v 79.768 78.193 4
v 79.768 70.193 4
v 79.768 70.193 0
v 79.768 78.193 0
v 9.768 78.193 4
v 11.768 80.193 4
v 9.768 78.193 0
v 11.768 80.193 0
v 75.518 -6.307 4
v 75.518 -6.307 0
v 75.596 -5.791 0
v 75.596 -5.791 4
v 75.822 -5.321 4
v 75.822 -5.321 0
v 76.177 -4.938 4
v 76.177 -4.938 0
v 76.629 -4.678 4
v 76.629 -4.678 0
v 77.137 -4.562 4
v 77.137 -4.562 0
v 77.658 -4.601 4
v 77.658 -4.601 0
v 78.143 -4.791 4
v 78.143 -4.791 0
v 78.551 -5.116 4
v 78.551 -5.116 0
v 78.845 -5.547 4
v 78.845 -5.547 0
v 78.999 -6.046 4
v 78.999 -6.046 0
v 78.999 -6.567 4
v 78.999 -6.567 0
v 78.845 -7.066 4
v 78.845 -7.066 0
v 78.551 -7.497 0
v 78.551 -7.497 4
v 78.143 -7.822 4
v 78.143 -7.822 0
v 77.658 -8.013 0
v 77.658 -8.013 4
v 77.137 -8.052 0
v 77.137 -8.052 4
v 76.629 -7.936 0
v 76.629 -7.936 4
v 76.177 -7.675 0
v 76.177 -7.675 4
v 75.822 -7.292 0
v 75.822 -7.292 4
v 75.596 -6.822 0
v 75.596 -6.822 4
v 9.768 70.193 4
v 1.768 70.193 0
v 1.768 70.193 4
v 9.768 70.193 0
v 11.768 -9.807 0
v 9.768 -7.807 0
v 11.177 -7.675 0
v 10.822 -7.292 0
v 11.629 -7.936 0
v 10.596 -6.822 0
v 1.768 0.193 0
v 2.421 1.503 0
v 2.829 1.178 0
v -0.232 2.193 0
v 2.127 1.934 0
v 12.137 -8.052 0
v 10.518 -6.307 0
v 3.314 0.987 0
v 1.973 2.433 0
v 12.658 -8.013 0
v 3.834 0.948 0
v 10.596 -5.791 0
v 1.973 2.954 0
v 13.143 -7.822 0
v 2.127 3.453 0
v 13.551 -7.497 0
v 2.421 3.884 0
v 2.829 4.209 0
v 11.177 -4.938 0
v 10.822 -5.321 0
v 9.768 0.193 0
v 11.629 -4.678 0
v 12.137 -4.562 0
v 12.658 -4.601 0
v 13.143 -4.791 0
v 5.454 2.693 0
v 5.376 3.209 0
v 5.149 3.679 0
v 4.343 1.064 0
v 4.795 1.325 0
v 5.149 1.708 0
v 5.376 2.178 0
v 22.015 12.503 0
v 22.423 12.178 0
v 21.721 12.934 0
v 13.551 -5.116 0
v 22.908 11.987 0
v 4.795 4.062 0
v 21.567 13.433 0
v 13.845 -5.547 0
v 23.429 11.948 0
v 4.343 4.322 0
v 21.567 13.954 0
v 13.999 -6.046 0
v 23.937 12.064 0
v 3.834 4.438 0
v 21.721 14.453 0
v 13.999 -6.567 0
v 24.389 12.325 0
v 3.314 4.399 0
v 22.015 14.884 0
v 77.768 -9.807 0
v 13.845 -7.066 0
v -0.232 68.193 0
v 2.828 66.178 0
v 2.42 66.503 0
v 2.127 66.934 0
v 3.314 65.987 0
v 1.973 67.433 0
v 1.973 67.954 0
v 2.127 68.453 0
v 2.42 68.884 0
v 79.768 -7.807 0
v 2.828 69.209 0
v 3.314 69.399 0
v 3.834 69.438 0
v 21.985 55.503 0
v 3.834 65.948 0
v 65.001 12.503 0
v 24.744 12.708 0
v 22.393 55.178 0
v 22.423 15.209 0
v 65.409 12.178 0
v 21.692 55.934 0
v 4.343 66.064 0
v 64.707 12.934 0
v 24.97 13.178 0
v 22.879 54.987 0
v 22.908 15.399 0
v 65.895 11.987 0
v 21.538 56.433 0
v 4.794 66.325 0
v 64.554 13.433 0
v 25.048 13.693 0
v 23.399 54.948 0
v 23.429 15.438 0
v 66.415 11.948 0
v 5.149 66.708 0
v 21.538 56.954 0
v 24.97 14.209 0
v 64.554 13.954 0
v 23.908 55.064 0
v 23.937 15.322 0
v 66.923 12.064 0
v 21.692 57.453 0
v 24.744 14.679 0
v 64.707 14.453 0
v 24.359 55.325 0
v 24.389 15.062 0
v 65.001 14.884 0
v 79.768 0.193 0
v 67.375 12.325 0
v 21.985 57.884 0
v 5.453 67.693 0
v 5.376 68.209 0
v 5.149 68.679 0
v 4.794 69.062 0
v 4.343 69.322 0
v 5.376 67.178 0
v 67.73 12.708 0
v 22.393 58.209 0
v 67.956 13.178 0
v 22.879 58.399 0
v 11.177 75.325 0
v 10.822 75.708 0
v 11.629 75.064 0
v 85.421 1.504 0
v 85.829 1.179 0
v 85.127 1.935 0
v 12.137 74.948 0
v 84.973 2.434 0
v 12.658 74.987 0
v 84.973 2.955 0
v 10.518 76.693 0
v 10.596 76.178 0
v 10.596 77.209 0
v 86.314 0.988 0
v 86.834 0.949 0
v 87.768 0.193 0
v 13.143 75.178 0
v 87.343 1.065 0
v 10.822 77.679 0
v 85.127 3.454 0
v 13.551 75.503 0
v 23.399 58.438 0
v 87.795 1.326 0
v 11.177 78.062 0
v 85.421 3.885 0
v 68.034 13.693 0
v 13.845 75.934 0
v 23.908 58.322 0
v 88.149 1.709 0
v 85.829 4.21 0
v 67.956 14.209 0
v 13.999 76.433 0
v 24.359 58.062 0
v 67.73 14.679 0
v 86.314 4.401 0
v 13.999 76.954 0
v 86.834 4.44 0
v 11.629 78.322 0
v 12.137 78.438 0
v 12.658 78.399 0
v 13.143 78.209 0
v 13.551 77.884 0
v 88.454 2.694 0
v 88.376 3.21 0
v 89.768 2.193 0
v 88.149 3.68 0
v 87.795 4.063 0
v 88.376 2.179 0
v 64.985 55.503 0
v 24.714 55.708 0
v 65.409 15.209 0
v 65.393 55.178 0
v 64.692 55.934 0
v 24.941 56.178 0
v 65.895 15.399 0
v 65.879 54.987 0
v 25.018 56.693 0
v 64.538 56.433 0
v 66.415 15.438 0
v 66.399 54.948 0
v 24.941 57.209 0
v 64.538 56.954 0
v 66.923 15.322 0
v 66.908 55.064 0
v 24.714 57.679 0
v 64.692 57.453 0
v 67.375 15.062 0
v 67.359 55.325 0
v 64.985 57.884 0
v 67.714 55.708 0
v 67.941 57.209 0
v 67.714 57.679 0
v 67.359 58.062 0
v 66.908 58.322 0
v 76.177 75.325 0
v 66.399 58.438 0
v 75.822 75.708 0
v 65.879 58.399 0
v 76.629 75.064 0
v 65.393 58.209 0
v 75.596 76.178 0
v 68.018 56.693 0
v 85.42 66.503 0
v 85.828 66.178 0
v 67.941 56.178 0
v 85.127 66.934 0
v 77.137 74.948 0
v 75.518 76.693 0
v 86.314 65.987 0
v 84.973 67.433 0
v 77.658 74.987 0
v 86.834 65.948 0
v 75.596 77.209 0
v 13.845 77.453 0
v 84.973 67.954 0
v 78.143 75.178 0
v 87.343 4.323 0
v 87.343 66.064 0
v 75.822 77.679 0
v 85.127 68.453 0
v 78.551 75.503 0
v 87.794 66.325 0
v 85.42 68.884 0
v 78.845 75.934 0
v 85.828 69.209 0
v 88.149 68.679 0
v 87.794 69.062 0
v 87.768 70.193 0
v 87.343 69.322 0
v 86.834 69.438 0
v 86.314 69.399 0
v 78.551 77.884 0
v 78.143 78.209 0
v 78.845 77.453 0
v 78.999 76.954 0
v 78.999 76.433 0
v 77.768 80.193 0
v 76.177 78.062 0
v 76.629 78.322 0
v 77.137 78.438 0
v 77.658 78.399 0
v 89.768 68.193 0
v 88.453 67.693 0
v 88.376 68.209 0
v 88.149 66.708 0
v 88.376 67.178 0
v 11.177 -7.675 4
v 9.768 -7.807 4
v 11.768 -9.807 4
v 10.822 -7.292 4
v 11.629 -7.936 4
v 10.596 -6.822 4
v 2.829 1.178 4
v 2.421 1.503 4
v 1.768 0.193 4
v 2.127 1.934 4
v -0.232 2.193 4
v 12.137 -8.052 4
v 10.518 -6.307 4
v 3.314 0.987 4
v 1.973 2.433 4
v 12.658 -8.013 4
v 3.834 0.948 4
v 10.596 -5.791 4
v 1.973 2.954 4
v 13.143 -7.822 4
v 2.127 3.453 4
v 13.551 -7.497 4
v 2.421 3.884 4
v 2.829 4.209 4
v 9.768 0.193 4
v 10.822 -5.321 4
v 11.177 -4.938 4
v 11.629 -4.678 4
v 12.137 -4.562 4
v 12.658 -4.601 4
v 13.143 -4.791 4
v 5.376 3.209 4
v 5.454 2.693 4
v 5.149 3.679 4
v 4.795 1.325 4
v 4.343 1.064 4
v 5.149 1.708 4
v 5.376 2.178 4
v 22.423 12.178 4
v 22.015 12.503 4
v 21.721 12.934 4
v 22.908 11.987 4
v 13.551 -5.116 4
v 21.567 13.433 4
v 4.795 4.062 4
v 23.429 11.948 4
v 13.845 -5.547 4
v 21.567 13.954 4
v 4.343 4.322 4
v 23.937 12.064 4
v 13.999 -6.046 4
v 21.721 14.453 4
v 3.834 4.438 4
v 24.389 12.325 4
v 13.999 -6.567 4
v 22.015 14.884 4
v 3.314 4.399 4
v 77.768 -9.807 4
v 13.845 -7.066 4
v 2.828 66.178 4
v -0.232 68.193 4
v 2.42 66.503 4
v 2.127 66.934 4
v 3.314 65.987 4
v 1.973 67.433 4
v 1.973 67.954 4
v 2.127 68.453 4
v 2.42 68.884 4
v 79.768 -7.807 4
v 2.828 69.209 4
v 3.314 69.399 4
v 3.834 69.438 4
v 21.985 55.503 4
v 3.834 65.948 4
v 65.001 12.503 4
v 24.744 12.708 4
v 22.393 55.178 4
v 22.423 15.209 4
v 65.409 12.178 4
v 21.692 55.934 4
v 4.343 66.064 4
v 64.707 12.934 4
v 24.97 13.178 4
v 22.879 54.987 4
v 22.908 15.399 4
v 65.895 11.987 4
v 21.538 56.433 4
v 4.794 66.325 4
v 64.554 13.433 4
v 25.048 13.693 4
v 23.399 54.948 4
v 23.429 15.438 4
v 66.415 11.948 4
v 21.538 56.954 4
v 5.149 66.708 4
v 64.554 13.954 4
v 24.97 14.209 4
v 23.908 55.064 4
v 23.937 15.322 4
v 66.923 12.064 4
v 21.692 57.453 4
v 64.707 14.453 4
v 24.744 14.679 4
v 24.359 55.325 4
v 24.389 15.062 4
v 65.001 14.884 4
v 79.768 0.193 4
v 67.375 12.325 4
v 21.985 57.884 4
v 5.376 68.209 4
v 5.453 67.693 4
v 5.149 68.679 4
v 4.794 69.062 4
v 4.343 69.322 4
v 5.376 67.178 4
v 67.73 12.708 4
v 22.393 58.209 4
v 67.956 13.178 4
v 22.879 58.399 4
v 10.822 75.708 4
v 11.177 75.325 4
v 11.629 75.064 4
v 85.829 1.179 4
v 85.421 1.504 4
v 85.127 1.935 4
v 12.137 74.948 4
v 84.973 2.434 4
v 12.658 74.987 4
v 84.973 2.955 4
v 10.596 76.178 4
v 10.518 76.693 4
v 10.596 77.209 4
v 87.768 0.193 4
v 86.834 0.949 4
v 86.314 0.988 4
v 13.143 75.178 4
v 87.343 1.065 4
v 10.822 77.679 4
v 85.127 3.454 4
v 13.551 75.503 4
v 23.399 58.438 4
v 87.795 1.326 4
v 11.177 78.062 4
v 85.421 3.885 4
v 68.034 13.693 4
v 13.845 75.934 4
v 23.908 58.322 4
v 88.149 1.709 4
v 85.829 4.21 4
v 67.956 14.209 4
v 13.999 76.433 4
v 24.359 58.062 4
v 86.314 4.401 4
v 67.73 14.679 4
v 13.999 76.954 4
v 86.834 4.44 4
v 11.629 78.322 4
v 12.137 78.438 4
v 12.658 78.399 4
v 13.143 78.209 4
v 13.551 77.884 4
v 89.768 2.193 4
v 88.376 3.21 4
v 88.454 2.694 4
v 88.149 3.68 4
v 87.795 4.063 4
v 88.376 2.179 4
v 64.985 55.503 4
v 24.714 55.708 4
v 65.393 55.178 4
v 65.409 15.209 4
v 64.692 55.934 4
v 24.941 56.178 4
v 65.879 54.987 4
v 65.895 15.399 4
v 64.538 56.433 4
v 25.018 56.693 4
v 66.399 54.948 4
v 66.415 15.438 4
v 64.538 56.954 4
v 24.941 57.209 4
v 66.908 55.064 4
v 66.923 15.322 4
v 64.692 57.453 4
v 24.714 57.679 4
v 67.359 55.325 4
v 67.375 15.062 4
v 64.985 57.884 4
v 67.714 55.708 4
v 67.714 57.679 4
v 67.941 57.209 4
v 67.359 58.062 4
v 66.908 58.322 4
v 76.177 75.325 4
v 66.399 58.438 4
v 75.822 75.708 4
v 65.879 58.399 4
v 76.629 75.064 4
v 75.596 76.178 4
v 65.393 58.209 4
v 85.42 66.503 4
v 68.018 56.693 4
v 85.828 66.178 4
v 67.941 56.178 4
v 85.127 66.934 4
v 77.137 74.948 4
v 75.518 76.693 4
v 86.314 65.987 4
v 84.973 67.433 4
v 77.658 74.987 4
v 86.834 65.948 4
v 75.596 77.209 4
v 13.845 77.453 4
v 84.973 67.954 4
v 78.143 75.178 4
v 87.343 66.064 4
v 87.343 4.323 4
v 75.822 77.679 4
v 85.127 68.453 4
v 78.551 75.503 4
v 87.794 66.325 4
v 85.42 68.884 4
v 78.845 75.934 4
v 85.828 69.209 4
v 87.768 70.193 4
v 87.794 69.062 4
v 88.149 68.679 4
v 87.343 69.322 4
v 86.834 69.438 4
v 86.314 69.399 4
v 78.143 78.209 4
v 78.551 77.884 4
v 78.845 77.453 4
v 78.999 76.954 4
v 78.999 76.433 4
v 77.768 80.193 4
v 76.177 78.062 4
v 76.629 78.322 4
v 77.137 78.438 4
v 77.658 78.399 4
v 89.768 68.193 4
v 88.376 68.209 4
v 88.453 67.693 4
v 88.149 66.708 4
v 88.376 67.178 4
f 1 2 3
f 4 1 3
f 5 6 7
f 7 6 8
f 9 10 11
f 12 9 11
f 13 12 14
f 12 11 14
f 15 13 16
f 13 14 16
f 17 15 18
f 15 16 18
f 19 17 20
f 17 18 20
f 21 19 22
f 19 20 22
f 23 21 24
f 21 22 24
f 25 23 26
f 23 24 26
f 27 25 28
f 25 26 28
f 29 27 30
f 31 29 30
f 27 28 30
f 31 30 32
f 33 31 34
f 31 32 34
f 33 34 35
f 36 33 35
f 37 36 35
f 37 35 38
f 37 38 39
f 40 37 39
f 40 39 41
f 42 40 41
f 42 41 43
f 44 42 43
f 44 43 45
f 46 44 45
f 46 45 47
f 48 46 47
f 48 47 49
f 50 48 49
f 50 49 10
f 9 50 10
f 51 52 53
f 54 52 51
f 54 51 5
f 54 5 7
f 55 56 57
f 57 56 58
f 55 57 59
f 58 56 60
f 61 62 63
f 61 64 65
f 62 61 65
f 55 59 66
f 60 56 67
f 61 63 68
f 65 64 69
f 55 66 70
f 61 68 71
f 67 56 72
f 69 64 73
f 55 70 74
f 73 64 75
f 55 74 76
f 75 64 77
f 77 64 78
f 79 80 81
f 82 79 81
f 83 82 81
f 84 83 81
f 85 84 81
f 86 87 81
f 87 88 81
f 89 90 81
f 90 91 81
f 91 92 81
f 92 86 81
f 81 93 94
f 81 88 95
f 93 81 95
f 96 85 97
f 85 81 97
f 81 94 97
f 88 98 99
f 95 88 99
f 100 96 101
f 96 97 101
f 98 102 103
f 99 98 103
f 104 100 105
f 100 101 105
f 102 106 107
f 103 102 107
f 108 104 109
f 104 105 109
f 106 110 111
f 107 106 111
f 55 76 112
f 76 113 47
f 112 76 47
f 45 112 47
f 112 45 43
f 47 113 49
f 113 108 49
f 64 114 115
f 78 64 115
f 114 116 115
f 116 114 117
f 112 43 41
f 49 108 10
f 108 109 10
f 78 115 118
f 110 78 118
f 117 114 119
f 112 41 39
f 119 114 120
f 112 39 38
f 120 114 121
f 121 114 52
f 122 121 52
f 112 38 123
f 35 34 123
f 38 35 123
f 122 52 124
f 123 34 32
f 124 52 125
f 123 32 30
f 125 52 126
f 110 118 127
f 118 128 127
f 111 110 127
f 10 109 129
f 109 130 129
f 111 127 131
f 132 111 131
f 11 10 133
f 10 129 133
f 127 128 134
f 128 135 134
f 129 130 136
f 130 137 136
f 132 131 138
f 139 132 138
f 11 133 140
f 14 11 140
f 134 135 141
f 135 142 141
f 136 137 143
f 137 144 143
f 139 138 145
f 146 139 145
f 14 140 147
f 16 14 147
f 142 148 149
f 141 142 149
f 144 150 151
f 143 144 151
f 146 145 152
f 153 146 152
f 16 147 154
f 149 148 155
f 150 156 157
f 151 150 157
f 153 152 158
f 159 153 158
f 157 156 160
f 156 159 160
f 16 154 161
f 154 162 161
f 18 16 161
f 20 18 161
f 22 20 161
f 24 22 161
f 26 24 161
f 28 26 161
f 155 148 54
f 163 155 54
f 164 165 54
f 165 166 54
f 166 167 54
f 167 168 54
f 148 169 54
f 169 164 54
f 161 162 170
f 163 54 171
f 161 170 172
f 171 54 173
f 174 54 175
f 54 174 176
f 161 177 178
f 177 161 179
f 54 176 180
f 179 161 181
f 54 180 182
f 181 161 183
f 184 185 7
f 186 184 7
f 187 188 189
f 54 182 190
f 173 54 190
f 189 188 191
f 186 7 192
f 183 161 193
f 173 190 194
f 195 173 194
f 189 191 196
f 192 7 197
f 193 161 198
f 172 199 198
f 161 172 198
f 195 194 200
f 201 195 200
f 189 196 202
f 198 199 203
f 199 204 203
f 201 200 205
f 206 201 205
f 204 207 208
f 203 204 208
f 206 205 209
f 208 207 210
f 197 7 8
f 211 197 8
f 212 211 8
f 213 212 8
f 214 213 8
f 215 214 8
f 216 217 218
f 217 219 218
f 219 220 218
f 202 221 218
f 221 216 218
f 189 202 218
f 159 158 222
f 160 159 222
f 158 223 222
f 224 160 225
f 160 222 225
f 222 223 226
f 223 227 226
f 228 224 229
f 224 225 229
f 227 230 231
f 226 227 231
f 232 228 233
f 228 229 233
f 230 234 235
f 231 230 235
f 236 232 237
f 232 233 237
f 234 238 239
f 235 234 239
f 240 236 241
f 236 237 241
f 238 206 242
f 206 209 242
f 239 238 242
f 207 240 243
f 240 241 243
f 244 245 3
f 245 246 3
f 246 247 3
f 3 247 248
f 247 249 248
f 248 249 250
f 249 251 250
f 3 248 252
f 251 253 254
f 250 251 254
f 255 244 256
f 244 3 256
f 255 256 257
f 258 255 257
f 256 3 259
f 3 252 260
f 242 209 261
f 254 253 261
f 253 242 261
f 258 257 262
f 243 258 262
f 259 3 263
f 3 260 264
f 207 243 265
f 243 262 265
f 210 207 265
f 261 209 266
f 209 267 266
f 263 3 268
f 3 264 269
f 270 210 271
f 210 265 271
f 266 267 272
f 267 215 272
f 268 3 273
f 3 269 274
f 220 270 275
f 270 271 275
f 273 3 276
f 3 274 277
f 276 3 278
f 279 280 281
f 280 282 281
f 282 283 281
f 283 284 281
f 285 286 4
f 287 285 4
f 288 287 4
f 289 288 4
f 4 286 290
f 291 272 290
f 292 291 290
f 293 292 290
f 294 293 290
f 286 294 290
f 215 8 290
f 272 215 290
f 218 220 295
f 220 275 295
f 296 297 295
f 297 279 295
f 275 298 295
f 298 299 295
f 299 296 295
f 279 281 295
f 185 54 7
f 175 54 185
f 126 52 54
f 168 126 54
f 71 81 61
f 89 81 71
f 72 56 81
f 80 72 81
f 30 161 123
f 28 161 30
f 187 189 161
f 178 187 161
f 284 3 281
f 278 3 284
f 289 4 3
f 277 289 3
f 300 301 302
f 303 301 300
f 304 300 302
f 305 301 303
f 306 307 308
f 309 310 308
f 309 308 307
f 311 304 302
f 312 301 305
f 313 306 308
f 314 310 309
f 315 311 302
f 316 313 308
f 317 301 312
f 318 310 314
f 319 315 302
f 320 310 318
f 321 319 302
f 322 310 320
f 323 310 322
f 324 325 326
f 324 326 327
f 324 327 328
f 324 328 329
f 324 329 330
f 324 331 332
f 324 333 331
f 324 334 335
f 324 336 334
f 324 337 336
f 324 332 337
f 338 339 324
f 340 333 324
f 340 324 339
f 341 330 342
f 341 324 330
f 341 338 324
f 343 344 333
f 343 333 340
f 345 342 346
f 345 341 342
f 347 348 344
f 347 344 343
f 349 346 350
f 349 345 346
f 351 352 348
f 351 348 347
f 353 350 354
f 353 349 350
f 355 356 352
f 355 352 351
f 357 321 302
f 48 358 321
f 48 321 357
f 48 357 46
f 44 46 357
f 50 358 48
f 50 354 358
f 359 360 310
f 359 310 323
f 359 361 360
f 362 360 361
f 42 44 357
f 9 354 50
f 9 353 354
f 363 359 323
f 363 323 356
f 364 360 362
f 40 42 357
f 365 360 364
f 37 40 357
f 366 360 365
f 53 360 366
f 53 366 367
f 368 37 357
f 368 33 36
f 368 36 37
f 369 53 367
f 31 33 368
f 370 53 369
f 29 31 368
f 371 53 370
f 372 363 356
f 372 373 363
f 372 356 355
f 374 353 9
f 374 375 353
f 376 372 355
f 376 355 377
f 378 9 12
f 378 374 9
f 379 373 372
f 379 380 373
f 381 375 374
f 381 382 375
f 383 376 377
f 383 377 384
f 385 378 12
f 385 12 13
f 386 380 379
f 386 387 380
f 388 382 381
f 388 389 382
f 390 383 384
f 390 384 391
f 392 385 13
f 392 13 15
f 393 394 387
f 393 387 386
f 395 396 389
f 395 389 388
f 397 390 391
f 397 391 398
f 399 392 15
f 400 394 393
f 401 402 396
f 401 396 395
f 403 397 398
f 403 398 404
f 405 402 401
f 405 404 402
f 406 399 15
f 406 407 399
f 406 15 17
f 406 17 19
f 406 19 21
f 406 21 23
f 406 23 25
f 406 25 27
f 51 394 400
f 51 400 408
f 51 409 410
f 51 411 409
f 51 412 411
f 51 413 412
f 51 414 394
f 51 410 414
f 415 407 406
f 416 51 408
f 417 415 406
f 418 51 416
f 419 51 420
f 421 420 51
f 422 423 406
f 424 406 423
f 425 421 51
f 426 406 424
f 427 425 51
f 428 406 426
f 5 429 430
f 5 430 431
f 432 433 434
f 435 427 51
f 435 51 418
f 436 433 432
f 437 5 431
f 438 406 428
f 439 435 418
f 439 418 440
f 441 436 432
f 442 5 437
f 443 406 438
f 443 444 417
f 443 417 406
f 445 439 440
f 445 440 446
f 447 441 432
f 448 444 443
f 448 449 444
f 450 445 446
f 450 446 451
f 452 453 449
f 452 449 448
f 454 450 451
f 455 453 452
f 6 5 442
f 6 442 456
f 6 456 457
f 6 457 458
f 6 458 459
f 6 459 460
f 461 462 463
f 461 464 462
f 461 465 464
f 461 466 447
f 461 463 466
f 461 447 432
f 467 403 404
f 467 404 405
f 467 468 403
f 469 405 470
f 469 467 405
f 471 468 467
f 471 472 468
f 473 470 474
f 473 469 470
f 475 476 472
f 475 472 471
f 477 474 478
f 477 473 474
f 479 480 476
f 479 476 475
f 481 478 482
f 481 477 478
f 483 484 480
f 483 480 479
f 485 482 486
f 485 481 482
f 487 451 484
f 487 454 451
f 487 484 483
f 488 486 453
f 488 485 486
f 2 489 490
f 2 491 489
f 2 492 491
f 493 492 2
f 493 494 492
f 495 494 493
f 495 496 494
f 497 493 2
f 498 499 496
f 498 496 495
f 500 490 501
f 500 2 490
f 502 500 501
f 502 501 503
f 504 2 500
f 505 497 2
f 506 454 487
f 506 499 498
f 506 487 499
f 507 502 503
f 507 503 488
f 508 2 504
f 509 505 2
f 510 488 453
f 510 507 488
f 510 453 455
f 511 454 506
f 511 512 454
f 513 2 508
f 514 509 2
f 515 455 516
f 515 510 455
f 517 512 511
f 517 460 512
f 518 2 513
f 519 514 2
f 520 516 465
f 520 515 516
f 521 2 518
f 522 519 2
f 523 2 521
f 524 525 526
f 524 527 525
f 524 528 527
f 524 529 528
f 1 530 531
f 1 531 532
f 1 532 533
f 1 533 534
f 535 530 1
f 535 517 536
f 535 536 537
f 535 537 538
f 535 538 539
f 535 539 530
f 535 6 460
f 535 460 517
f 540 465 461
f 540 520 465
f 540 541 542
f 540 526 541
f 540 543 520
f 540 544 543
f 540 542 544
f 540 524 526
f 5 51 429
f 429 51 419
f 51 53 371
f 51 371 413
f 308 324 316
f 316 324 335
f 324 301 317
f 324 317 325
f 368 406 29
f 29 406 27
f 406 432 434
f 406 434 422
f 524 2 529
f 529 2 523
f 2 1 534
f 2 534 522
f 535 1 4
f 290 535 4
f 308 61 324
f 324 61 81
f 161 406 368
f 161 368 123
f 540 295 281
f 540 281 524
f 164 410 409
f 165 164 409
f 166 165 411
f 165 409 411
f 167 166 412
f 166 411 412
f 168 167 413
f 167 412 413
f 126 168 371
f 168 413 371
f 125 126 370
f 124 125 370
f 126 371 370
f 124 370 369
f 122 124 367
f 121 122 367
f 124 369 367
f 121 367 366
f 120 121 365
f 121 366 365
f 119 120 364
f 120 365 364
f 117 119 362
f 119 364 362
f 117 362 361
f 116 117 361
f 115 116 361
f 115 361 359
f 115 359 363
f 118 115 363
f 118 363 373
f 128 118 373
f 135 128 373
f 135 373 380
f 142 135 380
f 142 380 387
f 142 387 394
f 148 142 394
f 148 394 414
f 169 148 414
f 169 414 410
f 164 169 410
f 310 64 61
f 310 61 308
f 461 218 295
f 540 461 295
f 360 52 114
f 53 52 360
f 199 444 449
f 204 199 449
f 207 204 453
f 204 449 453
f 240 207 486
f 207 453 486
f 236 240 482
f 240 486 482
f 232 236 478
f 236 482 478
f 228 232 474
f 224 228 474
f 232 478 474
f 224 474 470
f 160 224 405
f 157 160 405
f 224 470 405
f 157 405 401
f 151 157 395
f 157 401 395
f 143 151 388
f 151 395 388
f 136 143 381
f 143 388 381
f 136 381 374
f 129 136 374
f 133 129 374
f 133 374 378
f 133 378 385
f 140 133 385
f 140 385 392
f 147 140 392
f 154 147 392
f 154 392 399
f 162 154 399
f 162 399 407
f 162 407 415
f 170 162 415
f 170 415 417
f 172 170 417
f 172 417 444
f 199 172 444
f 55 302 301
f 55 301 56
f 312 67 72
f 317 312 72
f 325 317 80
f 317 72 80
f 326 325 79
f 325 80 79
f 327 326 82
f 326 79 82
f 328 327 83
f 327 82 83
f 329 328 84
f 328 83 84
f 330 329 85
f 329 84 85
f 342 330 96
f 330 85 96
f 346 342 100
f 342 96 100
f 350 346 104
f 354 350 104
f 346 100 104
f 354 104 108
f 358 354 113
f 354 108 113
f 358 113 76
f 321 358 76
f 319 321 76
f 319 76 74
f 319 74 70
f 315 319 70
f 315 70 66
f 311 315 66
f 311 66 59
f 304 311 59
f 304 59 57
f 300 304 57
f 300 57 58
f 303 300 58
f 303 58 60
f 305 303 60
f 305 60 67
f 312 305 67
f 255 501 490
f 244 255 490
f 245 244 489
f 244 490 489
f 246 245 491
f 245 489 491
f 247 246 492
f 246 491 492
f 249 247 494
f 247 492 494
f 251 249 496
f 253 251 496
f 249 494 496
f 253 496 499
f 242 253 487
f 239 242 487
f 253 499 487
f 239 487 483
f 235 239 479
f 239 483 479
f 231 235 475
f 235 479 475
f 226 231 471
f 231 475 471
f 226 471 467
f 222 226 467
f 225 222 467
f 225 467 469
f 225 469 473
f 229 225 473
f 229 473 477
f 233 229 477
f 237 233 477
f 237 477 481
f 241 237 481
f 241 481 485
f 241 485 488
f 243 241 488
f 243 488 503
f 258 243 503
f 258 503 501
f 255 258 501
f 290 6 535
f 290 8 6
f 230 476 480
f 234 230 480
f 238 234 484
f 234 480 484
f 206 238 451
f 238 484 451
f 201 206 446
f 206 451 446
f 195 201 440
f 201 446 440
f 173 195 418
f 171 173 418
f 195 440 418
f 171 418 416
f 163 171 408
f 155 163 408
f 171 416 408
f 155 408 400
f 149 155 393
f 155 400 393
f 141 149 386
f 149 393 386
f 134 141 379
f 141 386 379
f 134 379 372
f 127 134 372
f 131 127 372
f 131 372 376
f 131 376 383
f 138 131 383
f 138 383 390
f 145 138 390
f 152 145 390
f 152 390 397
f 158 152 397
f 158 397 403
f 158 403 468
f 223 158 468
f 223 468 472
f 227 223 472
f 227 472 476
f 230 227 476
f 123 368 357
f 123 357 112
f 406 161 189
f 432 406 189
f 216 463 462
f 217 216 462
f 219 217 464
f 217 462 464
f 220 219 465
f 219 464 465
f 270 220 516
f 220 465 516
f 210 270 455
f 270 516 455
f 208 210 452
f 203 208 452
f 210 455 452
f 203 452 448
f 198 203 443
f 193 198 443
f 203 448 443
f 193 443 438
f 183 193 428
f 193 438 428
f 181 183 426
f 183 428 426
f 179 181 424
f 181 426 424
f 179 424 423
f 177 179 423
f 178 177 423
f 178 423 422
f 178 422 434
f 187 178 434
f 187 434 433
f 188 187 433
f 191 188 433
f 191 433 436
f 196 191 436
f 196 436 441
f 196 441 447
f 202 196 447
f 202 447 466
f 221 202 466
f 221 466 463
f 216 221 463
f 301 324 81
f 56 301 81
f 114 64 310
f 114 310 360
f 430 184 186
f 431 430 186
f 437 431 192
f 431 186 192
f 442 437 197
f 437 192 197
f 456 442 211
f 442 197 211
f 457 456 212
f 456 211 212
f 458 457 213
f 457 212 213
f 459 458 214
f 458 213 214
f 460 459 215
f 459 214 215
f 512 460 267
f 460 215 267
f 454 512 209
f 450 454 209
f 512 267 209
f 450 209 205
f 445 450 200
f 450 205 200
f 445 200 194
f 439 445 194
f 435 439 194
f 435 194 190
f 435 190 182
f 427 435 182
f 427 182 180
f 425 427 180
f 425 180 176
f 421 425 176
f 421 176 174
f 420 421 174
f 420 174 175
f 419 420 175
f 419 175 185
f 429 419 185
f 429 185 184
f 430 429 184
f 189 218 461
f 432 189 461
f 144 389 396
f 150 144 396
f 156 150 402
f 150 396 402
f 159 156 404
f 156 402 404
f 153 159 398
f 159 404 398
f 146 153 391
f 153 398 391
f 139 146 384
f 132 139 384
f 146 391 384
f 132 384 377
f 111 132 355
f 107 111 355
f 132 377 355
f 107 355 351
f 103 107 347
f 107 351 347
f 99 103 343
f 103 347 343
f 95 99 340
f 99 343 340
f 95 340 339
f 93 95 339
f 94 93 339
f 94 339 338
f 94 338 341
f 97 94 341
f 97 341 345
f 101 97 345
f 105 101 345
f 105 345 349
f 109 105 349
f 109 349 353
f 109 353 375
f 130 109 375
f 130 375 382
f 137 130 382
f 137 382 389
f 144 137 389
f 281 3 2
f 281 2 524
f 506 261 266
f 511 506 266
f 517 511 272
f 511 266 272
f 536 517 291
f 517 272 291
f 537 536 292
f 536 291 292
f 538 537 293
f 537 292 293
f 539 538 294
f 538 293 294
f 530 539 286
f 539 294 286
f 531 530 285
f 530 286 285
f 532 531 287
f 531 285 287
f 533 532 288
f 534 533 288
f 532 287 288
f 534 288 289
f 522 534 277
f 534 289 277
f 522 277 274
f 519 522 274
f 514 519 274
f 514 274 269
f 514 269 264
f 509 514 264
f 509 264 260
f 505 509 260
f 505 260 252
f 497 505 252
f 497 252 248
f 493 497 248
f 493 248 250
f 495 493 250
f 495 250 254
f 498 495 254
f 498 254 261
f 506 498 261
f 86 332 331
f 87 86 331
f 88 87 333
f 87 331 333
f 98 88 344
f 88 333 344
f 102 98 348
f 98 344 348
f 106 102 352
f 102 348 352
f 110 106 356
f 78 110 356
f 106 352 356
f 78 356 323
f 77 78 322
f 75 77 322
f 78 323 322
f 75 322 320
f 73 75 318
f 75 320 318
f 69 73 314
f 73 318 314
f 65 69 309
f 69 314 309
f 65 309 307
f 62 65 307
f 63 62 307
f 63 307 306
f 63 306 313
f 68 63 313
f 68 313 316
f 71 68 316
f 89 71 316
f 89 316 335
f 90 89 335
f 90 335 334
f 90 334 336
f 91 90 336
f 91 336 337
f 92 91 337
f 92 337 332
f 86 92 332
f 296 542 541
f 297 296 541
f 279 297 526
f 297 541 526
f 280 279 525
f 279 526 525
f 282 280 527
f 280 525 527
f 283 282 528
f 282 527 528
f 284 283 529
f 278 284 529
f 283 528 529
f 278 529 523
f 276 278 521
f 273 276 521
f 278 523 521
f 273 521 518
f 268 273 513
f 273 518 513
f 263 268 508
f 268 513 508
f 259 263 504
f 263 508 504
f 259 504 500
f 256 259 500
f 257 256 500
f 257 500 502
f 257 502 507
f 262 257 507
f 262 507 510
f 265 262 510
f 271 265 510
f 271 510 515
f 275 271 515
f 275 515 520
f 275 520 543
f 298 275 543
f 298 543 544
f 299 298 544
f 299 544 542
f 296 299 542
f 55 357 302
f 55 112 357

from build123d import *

# Parameters (mm, degrees)
SKETCH1_W           = 90
SKETCH1_H           = 70
BOSS_EXTRUDE1_DEPTH = 4
SKETCH2_R           = 1.75
CUT_EXTRUDE1_DEPTH  = 5
CHAMFER1_SIZE       = 2
CHAMFER2_SIZE       = 2
CHAMFER3_SIZE       = 2
CHAMFER4_SIZE       = 2
SKETCH5_W           = 70
SKETCH5_H           = 4
BOSS_EXTRUDE3_DEPTH = 10
SKETCH4_W           = 70
SKETCH4_H           = 4
BOSS_EXTRUDE4_DEPTH = 10
SKETCH6_R           = 1.75
CUT_EXTRUDE2_DEPTH  = 10
CHAMFER5_SIZE       = 2


with BuildPart() as part:
    # Sketch1 → Boss-Extrude1 (new body)
    with BuildSketch(Plane.XY):
        with Locations((44.768273235, 35.193370166)):
            Rectangle(SKETCH1_W, SKETCH1_H)
    extrude(amount=BOSS_EXTRUDE1_DEPTH)

    # Sketch2 → Cut-Extrude1 (cut)
    with BuildSketch(Plane.XY.offset(4)):
        with Locations((3.703568783, 2.693370166)):
            Circle(SKETCH2_R)
        with Locations((86.703568783, 2.694436567)):
            Circle(SKETCH2_R)
        with Locations((86.703273235, 67.693370166)):
            Circle(SKETCH2_R)
        with Locations((3.703273235, 67.693370166)):
            Circle(SKETCH2_R)
        with Locations((23.297725672, 13.693370166)):
            Circle(SKETCH2_R)
        with Locations((66.284051901, 13.693370166)):
            Circle(SKETCH2_R)
        with Locations((66.268273235, 56.693370166)):
            Circle(SKETCH2_R)
        with Locations((23.268273235, 56.693370166)):
            Circle(SKETCH2_R)
    extrude(amount=-CUT_EXTRUDE1_DEPTH, mode=Mode.SUBTRACT)

    # Chamfer1
    chamfer1_edges = [part.edges().sort_by_distance(p)[0] for p in [
        (89.768273235, 0.193370166, 2),
    ]]
    chamfer(chamfer1_edges, length=CHAMFER1_SIZE)

    # Chamfer2
    chamfer2_edges = [part.edges().sort_by_distance(p)[0] for p in [
        (-0.231726765, 0.193370166, 2),
    ]]
    chamfer(chamfer2_edges, length=CHAMFER2_SIZE)

    # Chamfer3
    chamfer3_edges = [part.edges().sort_by_distance(p)[0] for p in [
        (-0.231726765, 70.193370166, 2),
    ]]
    chamfer(chamfer3_edges, length=CHAMFER3_SIZE)

    # Chamfer4
    chamfer4_edges = [part.edges().sort_by_distance(p)[0] for p in [
        (89.768273235, 70.193370166, 2),
    ]]
    chamfer(chamfer4_edges, length=CHAMFER4_SIZE)

    # Sketch5 → Boss-Extrude3 (add)
    with BuildSketch(Plane(origin=(0, 70.193370166, 0), x_dir=(1, 0, 0), z_dir=(0, 1, 0))):
        with Locations((44.768273235, -2)):
            Rectangle(SKETCH5_W, SKETCH5_H)
    extrude(amount=BOSS_EXTRUDE3_DEPTH)

    # Sketch4 → Boss-Extrude4 (add)
    with BuildSketch(Plane(origin=(0, 0.193370166, 0), x_dir=(-1, 0, 0), z_dir=(0, -1, 0))):
        with Locations((-44.768273235, -2)):
            Rectangle(SKETCH4_W, SKETCH4_H)
    extrude(amount=BOSS_EXTRUDE4_DEPTH)

    # Sketch6 → Cut-Extrude2 (cut)
    with BuildSketch(Plane(origin=(0, 0, 0), x_dir=(-1, 0, 0), z_dir=(0, 0, -1))):
        with Locations((-12.268273235, 76.693370166)):
            Circle(SKETCH6_R)
        with Locations((-77.268273235, 76.693370166)):
            Circle(SKETCH6_R)
        with Locations((-77.268273235, -6.306629834)):
            Circle(SKETCH6_R)
        with Locations((-12.268273235, -6.306629834)):
            Circle(SKETCH6_R)
    extrude(amount=-CUT_EXTRUDE2_DEPTH, mode=Mode.SUBTRACT)

    # Chamfer5
    chamfer5_edges = [part.edges().sort_by_distance(p)[0] for p in [
        (9.768273235, 80.193370166, 2),
        (79.768273235, 80.193370166, 2),
        (9.768273235, -9.806629834, 2),
        (79.768273235, -9.806629834, 2),
    ]]
    chamfer(chamfer5_edges, length=CHAMFER5_SIZE)


solid = part.part
